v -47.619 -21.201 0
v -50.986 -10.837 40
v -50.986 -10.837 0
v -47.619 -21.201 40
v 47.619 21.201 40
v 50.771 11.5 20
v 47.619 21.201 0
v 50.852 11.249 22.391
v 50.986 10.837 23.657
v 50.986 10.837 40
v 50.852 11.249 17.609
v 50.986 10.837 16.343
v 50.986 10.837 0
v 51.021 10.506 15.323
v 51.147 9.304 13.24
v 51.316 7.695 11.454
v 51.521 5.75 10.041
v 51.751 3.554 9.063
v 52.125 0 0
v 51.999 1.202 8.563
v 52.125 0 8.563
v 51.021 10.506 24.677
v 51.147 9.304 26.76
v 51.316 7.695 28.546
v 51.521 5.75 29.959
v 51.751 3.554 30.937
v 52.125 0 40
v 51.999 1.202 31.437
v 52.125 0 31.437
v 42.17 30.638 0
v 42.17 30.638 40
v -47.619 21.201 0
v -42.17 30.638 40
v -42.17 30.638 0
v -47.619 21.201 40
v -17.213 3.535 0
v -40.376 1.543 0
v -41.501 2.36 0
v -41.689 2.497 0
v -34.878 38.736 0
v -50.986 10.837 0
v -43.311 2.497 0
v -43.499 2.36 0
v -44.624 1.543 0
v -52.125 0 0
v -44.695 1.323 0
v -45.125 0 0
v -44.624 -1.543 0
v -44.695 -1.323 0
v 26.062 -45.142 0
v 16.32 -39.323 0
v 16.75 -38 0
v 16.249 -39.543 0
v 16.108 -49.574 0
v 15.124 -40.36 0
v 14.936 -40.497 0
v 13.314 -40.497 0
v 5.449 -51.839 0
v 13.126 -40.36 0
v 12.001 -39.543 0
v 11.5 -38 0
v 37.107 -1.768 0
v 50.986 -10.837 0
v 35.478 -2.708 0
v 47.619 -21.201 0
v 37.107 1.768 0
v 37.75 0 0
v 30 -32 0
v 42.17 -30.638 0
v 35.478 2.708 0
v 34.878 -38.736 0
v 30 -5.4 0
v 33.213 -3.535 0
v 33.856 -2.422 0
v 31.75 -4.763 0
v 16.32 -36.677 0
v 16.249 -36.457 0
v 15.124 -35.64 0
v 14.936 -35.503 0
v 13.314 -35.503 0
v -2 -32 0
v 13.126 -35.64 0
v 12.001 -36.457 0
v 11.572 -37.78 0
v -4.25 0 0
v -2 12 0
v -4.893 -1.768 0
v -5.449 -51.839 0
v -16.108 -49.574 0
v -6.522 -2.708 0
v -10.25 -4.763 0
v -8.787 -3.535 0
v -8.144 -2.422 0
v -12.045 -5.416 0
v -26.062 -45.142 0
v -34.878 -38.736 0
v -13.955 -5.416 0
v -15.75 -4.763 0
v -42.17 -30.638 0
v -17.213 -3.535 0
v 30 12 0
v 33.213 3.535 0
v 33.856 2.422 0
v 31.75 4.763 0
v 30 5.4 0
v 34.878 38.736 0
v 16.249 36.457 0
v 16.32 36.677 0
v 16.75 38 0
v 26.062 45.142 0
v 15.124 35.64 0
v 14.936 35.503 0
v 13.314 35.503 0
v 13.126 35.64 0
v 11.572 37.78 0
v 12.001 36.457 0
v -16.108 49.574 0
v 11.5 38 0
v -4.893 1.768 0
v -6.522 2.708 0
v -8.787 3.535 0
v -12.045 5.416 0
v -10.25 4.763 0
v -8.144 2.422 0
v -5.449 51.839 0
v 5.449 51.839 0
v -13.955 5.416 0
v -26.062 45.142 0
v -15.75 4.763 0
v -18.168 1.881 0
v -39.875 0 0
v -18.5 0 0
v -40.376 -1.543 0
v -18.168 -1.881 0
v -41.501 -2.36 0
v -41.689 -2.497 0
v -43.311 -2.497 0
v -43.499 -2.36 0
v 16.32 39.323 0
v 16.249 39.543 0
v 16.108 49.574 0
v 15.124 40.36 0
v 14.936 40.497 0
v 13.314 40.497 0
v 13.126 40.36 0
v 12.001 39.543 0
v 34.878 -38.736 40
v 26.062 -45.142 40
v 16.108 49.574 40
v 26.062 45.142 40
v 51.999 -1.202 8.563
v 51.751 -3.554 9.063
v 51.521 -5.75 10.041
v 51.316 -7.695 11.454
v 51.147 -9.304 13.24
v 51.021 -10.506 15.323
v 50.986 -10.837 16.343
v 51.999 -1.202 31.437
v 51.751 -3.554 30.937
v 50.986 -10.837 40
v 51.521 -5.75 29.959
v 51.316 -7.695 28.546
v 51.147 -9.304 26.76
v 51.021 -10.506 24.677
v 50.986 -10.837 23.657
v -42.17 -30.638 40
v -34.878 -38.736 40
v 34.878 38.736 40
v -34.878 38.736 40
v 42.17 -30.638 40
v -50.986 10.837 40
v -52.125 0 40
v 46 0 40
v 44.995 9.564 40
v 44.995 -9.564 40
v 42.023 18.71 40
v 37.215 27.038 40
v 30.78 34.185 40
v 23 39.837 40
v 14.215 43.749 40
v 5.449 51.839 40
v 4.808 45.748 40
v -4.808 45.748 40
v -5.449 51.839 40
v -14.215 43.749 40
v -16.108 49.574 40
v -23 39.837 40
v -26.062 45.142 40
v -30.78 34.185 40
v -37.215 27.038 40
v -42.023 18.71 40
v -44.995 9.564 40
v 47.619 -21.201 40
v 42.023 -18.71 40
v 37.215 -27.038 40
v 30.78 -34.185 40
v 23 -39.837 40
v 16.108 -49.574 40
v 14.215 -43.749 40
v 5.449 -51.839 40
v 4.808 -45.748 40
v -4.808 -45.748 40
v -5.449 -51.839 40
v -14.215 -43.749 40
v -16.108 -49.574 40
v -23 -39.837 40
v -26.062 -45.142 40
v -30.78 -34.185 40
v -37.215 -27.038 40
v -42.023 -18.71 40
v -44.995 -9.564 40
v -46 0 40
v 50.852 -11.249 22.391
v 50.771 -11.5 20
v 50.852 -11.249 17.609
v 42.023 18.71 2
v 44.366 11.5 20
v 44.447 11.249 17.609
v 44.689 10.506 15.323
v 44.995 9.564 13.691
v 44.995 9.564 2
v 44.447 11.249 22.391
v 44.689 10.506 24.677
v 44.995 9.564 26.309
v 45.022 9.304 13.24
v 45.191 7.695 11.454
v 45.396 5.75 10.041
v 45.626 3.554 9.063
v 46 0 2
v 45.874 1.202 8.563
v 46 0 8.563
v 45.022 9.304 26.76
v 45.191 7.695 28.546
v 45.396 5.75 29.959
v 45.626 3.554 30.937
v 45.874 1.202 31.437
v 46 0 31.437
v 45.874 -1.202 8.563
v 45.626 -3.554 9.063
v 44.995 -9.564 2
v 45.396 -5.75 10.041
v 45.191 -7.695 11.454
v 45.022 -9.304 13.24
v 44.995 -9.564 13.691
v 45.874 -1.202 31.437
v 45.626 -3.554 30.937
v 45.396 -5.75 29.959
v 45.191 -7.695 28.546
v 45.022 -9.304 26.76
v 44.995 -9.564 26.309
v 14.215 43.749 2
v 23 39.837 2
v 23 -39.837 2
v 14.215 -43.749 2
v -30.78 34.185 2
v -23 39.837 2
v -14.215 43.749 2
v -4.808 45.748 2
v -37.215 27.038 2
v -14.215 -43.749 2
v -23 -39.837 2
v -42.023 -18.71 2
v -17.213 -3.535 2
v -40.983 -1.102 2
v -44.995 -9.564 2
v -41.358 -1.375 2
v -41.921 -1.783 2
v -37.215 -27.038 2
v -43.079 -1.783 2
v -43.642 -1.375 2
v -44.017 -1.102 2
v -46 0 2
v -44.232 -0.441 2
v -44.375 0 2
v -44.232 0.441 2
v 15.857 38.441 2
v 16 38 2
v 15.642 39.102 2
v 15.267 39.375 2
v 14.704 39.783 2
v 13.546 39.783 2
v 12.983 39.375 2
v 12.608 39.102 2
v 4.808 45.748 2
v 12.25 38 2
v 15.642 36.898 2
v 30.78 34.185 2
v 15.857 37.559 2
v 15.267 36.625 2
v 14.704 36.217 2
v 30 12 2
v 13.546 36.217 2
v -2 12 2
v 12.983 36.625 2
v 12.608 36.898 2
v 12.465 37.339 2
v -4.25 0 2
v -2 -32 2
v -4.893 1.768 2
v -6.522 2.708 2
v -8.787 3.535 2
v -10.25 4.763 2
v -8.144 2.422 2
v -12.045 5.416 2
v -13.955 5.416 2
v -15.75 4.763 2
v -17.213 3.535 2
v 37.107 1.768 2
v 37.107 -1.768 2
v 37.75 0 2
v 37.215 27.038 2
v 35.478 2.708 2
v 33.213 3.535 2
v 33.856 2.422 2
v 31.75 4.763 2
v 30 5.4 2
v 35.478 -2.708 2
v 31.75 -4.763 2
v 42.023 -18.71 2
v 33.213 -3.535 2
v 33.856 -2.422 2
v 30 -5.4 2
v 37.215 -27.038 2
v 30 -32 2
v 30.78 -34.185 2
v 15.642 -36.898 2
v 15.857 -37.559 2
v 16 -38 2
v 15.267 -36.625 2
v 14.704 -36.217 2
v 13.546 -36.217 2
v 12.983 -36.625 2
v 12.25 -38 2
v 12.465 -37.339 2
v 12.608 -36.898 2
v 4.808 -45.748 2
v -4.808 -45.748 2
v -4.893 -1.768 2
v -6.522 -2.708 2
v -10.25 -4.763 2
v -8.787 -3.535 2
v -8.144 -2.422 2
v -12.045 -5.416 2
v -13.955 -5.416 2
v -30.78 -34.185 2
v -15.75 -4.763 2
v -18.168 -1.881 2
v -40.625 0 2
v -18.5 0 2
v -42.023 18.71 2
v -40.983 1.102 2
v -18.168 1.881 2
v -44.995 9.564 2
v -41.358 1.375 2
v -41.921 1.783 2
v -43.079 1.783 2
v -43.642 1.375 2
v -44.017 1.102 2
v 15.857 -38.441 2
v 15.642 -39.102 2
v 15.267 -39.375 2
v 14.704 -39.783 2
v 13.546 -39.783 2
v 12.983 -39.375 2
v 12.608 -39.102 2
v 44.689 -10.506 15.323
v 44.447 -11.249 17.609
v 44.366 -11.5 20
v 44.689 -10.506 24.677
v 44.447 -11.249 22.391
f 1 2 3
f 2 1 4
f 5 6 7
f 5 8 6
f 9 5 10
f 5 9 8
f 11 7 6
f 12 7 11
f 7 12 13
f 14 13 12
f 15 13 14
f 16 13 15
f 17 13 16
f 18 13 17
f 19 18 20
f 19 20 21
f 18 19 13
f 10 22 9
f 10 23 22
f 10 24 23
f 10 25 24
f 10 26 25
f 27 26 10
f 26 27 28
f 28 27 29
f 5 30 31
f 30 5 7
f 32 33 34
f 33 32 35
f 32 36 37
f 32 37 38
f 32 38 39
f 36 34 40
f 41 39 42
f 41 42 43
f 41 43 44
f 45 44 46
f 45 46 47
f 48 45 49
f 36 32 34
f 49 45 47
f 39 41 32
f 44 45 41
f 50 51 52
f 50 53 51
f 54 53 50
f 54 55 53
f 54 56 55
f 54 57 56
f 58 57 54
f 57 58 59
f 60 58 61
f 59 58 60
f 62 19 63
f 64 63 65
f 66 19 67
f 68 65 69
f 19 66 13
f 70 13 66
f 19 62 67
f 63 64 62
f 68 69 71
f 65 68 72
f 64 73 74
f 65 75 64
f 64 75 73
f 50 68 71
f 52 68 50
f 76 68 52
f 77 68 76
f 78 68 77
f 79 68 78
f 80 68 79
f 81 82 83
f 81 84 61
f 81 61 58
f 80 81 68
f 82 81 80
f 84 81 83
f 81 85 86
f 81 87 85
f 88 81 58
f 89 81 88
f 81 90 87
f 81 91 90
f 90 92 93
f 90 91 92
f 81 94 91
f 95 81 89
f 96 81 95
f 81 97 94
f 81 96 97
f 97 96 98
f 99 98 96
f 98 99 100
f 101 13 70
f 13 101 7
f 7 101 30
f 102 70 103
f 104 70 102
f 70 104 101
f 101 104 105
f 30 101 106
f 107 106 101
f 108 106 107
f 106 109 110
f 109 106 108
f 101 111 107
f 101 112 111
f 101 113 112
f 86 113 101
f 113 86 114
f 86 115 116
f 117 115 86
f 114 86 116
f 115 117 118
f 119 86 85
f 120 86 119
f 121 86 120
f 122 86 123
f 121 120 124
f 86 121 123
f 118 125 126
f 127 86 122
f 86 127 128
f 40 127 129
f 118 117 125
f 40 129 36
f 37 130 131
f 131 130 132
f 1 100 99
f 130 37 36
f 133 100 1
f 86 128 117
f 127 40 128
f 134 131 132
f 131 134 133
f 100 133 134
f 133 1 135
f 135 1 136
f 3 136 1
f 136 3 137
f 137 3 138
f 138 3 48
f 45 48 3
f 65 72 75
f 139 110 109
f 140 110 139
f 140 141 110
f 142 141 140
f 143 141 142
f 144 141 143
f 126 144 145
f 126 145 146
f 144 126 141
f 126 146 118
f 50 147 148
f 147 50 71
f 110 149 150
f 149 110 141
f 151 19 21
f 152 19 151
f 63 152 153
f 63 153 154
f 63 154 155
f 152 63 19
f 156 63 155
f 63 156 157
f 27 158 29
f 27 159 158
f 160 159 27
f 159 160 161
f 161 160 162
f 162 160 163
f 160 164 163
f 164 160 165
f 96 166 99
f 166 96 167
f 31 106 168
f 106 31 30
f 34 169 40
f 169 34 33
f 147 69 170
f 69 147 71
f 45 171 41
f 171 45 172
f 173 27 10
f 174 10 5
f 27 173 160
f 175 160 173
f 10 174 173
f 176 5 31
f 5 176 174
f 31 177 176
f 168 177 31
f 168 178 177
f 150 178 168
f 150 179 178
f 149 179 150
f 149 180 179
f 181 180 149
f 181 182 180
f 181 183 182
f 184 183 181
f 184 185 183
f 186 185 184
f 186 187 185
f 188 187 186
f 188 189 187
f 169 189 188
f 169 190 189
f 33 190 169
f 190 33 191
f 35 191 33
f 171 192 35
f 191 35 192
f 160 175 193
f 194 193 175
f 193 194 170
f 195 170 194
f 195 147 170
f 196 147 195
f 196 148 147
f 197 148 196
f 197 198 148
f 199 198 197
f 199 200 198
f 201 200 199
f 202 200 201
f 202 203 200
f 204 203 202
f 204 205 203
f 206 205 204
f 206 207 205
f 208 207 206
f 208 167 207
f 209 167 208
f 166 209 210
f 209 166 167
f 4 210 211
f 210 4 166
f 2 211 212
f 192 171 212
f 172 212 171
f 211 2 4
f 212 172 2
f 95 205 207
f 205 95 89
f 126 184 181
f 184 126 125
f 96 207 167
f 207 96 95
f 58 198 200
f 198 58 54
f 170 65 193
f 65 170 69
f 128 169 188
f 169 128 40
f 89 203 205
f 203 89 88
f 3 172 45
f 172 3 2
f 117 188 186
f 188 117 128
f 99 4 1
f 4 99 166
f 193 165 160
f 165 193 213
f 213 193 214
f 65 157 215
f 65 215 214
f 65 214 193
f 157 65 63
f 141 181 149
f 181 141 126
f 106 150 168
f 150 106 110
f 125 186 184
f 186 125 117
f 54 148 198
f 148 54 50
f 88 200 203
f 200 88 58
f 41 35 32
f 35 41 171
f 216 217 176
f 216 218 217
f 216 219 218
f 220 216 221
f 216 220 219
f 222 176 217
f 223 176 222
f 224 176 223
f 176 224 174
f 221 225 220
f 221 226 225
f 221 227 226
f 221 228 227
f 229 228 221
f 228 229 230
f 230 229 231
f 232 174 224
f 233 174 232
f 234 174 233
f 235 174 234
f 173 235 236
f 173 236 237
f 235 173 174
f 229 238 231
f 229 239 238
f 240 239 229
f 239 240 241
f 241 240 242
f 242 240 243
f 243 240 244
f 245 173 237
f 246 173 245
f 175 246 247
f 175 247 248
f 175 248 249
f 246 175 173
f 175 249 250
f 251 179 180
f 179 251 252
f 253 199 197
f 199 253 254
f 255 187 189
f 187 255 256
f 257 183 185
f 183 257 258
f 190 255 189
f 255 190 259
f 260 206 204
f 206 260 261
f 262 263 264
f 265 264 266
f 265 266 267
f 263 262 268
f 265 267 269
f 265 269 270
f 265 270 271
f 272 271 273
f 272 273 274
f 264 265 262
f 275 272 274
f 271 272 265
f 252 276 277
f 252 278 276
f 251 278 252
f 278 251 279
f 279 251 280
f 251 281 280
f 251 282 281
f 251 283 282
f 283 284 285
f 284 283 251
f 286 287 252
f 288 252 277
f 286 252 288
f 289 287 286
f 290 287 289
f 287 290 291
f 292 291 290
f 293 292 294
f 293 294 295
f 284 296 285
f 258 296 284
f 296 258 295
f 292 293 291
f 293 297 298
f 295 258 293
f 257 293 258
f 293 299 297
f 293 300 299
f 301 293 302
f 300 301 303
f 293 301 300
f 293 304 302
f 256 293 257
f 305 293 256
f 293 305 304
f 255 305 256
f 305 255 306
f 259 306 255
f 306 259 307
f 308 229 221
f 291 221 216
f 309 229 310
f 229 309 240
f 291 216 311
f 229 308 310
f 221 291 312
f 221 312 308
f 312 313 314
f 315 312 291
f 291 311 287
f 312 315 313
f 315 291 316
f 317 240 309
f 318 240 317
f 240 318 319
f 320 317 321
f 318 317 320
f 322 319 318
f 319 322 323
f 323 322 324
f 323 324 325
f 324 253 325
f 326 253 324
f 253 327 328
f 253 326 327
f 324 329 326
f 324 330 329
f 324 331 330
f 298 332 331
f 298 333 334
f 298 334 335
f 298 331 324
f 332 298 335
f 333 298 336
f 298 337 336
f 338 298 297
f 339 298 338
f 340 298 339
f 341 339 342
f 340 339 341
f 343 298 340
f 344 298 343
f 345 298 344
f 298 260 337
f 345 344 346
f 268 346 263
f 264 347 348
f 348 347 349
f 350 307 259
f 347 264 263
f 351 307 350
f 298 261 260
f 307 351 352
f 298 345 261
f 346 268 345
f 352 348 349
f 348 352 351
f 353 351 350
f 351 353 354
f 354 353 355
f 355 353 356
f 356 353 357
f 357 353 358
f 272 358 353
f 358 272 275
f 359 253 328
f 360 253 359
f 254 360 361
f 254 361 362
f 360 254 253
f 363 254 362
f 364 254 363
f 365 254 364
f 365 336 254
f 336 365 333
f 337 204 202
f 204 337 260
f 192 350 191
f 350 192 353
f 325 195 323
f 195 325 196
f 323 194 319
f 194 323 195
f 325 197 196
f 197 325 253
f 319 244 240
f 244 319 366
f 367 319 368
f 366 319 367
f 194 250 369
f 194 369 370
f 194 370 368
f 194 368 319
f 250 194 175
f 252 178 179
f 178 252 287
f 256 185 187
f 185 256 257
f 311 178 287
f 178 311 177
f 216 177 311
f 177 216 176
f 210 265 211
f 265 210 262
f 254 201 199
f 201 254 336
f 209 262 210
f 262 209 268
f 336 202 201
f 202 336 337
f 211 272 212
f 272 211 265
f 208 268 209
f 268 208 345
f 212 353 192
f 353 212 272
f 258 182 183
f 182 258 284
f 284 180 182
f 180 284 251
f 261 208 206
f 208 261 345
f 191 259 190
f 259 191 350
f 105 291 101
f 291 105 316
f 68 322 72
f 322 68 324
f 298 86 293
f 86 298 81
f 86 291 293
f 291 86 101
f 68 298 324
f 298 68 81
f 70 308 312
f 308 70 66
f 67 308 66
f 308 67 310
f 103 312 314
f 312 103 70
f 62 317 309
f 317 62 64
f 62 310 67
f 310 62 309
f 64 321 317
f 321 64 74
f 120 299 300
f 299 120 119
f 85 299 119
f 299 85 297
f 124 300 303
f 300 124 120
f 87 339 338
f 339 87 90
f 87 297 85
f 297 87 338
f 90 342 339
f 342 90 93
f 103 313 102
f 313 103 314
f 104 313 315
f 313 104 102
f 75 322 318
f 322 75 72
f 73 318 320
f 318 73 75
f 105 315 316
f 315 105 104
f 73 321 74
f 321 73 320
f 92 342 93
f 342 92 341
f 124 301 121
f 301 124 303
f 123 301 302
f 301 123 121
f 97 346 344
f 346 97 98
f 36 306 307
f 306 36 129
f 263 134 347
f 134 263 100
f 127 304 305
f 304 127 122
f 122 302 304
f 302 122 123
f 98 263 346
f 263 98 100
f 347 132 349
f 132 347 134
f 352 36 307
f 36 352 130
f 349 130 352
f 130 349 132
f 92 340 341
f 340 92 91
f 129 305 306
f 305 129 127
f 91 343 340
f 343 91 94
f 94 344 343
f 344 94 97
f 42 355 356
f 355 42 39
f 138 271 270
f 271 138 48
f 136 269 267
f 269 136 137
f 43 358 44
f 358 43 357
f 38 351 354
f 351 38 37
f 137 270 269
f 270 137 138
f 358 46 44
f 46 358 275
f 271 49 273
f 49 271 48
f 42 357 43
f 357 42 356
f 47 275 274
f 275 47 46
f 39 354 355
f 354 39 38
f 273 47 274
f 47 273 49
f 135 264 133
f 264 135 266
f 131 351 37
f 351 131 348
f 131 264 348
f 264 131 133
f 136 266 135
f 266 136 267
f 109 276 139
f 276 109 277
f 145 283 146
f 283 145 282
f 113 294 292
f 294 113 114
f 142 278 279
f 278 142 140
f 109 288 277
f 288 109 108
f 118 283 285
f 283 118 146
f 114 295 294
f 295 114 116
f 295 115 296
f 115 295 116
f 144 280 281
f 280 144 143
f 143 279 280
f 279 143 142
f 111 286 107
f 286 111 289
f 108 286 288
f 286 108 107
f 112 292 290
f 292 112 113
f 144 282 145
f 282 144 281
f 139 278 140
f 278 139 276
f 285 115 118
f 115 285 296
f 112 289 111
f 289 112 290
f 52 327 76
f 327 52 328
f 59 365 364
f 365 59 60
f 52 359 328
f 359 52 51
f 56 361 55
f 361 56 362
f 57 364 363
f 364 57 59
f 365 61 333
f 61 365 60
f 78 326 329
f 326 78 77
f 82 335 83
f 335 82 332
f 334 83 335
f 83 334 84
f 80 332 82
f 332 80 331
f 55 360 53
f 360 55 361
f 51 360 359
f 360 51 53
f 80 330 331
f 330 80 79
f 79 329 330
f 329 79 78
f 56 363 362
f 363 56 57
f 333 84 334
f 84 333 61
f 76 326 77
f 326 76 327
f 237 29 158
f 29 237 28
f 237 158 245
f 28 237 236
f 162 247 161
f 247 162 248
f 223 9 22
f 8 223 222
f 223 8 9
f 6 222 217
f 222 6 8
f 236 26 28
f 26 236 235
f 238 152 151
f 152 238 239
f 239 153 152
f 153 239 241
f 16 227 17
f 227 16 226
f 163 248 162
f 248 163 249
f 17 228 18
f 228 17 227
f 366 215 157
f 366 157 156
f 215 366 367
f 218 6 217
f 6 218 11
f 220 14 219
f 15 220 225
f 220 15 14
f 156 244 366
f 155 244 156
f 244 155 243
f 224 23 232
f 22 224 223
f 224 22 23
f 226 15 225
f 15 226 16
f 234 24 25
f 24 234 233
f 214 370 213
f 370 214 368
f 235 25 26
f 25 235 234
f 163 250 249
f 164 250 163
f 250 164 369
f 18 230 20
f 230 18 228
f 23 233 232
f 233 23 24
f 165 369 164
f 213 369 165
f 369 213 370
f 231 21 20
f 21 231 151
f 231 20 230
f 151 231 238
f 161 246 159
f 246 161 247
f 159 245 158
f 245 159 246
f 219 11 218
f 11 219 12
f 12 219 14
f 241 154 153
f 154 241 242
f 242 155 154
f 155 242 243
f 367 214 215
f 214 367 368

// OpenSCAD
buttonDiameter=23;
overallDiameter=104.25;
insideDiameterImportant=92;
distanceBetweenMountingHoles=42;
mountingHoleDiameter=5.5;
backWindowWidth=44;
backWindowHeight=32;
frontScrewDiameter=3;
distanceBetweenFrontScrews=68;
distanceFromOutsideEdgeToScrew=9.25;
// heightAtBottomLogo=31.5;
heightAtBottomLogo=40;
bottomPlateThickness=2;

difference() {
    difference() {
        // main body
        difference() {
            cylinder(h=heightAtBottomLogo, d=overallDiameter);
            translate([0, 0, bottomPlateThickness])
                cylinder(h=100, d=insideDiameterImportant);
        }
        
        // back window
        translate([-2, -32, -10])
            cube([backWindowHeight, backWindowWidth, 100]);
        
        
        topMountX=35;
        
        // mounting holes
        translate([topMountX, 0, -10])
            cylinder(h=100, d=mountingHoleDiameter);
        
        translate([(distanceBetweenMountingHoles - topMountX) * -1, 0, -10])
            cylinder(h=100, d=mountingHoleDiameter);
        
        // mounting hole guides
        translate([topMountX -6, 0, -10])
            cylinder(h=100, d=mountingHoleDiameter*2);
        
        translate([(distanceBetweenMountingHoles - topMountX) * -1 -6, 0, -10])
            cylinder(h=100, d=mountingHoleDiameter*2);
            
        // screw holes
        distanceToScrewFromCenter=-42.5;
        distanceBetween=58.89;
        
        translate([distanceToScrewFromCenter, 0, -1])
            cylinder(h=4, d1=frontScrewDiameter * 2, d2=frontScrewDiameter);
            
        translate([14.125, 38, -1])
            cylinder(h=4, d1=frontScrewDiameter * 2, d2=frontScrewDiameter);
            
        translate([14.125, -38, -1])
            cylinder(h=4, d1=frontScrewDiameter * 2, d2=frontScrewDiameter);
           
    }
    
    // hole for button
    translate([0, 0, heightAtBottomLogo/2])
        rotate([90, 0, 90])
            cylinder(h=100, d=buttonDiameter);
}
